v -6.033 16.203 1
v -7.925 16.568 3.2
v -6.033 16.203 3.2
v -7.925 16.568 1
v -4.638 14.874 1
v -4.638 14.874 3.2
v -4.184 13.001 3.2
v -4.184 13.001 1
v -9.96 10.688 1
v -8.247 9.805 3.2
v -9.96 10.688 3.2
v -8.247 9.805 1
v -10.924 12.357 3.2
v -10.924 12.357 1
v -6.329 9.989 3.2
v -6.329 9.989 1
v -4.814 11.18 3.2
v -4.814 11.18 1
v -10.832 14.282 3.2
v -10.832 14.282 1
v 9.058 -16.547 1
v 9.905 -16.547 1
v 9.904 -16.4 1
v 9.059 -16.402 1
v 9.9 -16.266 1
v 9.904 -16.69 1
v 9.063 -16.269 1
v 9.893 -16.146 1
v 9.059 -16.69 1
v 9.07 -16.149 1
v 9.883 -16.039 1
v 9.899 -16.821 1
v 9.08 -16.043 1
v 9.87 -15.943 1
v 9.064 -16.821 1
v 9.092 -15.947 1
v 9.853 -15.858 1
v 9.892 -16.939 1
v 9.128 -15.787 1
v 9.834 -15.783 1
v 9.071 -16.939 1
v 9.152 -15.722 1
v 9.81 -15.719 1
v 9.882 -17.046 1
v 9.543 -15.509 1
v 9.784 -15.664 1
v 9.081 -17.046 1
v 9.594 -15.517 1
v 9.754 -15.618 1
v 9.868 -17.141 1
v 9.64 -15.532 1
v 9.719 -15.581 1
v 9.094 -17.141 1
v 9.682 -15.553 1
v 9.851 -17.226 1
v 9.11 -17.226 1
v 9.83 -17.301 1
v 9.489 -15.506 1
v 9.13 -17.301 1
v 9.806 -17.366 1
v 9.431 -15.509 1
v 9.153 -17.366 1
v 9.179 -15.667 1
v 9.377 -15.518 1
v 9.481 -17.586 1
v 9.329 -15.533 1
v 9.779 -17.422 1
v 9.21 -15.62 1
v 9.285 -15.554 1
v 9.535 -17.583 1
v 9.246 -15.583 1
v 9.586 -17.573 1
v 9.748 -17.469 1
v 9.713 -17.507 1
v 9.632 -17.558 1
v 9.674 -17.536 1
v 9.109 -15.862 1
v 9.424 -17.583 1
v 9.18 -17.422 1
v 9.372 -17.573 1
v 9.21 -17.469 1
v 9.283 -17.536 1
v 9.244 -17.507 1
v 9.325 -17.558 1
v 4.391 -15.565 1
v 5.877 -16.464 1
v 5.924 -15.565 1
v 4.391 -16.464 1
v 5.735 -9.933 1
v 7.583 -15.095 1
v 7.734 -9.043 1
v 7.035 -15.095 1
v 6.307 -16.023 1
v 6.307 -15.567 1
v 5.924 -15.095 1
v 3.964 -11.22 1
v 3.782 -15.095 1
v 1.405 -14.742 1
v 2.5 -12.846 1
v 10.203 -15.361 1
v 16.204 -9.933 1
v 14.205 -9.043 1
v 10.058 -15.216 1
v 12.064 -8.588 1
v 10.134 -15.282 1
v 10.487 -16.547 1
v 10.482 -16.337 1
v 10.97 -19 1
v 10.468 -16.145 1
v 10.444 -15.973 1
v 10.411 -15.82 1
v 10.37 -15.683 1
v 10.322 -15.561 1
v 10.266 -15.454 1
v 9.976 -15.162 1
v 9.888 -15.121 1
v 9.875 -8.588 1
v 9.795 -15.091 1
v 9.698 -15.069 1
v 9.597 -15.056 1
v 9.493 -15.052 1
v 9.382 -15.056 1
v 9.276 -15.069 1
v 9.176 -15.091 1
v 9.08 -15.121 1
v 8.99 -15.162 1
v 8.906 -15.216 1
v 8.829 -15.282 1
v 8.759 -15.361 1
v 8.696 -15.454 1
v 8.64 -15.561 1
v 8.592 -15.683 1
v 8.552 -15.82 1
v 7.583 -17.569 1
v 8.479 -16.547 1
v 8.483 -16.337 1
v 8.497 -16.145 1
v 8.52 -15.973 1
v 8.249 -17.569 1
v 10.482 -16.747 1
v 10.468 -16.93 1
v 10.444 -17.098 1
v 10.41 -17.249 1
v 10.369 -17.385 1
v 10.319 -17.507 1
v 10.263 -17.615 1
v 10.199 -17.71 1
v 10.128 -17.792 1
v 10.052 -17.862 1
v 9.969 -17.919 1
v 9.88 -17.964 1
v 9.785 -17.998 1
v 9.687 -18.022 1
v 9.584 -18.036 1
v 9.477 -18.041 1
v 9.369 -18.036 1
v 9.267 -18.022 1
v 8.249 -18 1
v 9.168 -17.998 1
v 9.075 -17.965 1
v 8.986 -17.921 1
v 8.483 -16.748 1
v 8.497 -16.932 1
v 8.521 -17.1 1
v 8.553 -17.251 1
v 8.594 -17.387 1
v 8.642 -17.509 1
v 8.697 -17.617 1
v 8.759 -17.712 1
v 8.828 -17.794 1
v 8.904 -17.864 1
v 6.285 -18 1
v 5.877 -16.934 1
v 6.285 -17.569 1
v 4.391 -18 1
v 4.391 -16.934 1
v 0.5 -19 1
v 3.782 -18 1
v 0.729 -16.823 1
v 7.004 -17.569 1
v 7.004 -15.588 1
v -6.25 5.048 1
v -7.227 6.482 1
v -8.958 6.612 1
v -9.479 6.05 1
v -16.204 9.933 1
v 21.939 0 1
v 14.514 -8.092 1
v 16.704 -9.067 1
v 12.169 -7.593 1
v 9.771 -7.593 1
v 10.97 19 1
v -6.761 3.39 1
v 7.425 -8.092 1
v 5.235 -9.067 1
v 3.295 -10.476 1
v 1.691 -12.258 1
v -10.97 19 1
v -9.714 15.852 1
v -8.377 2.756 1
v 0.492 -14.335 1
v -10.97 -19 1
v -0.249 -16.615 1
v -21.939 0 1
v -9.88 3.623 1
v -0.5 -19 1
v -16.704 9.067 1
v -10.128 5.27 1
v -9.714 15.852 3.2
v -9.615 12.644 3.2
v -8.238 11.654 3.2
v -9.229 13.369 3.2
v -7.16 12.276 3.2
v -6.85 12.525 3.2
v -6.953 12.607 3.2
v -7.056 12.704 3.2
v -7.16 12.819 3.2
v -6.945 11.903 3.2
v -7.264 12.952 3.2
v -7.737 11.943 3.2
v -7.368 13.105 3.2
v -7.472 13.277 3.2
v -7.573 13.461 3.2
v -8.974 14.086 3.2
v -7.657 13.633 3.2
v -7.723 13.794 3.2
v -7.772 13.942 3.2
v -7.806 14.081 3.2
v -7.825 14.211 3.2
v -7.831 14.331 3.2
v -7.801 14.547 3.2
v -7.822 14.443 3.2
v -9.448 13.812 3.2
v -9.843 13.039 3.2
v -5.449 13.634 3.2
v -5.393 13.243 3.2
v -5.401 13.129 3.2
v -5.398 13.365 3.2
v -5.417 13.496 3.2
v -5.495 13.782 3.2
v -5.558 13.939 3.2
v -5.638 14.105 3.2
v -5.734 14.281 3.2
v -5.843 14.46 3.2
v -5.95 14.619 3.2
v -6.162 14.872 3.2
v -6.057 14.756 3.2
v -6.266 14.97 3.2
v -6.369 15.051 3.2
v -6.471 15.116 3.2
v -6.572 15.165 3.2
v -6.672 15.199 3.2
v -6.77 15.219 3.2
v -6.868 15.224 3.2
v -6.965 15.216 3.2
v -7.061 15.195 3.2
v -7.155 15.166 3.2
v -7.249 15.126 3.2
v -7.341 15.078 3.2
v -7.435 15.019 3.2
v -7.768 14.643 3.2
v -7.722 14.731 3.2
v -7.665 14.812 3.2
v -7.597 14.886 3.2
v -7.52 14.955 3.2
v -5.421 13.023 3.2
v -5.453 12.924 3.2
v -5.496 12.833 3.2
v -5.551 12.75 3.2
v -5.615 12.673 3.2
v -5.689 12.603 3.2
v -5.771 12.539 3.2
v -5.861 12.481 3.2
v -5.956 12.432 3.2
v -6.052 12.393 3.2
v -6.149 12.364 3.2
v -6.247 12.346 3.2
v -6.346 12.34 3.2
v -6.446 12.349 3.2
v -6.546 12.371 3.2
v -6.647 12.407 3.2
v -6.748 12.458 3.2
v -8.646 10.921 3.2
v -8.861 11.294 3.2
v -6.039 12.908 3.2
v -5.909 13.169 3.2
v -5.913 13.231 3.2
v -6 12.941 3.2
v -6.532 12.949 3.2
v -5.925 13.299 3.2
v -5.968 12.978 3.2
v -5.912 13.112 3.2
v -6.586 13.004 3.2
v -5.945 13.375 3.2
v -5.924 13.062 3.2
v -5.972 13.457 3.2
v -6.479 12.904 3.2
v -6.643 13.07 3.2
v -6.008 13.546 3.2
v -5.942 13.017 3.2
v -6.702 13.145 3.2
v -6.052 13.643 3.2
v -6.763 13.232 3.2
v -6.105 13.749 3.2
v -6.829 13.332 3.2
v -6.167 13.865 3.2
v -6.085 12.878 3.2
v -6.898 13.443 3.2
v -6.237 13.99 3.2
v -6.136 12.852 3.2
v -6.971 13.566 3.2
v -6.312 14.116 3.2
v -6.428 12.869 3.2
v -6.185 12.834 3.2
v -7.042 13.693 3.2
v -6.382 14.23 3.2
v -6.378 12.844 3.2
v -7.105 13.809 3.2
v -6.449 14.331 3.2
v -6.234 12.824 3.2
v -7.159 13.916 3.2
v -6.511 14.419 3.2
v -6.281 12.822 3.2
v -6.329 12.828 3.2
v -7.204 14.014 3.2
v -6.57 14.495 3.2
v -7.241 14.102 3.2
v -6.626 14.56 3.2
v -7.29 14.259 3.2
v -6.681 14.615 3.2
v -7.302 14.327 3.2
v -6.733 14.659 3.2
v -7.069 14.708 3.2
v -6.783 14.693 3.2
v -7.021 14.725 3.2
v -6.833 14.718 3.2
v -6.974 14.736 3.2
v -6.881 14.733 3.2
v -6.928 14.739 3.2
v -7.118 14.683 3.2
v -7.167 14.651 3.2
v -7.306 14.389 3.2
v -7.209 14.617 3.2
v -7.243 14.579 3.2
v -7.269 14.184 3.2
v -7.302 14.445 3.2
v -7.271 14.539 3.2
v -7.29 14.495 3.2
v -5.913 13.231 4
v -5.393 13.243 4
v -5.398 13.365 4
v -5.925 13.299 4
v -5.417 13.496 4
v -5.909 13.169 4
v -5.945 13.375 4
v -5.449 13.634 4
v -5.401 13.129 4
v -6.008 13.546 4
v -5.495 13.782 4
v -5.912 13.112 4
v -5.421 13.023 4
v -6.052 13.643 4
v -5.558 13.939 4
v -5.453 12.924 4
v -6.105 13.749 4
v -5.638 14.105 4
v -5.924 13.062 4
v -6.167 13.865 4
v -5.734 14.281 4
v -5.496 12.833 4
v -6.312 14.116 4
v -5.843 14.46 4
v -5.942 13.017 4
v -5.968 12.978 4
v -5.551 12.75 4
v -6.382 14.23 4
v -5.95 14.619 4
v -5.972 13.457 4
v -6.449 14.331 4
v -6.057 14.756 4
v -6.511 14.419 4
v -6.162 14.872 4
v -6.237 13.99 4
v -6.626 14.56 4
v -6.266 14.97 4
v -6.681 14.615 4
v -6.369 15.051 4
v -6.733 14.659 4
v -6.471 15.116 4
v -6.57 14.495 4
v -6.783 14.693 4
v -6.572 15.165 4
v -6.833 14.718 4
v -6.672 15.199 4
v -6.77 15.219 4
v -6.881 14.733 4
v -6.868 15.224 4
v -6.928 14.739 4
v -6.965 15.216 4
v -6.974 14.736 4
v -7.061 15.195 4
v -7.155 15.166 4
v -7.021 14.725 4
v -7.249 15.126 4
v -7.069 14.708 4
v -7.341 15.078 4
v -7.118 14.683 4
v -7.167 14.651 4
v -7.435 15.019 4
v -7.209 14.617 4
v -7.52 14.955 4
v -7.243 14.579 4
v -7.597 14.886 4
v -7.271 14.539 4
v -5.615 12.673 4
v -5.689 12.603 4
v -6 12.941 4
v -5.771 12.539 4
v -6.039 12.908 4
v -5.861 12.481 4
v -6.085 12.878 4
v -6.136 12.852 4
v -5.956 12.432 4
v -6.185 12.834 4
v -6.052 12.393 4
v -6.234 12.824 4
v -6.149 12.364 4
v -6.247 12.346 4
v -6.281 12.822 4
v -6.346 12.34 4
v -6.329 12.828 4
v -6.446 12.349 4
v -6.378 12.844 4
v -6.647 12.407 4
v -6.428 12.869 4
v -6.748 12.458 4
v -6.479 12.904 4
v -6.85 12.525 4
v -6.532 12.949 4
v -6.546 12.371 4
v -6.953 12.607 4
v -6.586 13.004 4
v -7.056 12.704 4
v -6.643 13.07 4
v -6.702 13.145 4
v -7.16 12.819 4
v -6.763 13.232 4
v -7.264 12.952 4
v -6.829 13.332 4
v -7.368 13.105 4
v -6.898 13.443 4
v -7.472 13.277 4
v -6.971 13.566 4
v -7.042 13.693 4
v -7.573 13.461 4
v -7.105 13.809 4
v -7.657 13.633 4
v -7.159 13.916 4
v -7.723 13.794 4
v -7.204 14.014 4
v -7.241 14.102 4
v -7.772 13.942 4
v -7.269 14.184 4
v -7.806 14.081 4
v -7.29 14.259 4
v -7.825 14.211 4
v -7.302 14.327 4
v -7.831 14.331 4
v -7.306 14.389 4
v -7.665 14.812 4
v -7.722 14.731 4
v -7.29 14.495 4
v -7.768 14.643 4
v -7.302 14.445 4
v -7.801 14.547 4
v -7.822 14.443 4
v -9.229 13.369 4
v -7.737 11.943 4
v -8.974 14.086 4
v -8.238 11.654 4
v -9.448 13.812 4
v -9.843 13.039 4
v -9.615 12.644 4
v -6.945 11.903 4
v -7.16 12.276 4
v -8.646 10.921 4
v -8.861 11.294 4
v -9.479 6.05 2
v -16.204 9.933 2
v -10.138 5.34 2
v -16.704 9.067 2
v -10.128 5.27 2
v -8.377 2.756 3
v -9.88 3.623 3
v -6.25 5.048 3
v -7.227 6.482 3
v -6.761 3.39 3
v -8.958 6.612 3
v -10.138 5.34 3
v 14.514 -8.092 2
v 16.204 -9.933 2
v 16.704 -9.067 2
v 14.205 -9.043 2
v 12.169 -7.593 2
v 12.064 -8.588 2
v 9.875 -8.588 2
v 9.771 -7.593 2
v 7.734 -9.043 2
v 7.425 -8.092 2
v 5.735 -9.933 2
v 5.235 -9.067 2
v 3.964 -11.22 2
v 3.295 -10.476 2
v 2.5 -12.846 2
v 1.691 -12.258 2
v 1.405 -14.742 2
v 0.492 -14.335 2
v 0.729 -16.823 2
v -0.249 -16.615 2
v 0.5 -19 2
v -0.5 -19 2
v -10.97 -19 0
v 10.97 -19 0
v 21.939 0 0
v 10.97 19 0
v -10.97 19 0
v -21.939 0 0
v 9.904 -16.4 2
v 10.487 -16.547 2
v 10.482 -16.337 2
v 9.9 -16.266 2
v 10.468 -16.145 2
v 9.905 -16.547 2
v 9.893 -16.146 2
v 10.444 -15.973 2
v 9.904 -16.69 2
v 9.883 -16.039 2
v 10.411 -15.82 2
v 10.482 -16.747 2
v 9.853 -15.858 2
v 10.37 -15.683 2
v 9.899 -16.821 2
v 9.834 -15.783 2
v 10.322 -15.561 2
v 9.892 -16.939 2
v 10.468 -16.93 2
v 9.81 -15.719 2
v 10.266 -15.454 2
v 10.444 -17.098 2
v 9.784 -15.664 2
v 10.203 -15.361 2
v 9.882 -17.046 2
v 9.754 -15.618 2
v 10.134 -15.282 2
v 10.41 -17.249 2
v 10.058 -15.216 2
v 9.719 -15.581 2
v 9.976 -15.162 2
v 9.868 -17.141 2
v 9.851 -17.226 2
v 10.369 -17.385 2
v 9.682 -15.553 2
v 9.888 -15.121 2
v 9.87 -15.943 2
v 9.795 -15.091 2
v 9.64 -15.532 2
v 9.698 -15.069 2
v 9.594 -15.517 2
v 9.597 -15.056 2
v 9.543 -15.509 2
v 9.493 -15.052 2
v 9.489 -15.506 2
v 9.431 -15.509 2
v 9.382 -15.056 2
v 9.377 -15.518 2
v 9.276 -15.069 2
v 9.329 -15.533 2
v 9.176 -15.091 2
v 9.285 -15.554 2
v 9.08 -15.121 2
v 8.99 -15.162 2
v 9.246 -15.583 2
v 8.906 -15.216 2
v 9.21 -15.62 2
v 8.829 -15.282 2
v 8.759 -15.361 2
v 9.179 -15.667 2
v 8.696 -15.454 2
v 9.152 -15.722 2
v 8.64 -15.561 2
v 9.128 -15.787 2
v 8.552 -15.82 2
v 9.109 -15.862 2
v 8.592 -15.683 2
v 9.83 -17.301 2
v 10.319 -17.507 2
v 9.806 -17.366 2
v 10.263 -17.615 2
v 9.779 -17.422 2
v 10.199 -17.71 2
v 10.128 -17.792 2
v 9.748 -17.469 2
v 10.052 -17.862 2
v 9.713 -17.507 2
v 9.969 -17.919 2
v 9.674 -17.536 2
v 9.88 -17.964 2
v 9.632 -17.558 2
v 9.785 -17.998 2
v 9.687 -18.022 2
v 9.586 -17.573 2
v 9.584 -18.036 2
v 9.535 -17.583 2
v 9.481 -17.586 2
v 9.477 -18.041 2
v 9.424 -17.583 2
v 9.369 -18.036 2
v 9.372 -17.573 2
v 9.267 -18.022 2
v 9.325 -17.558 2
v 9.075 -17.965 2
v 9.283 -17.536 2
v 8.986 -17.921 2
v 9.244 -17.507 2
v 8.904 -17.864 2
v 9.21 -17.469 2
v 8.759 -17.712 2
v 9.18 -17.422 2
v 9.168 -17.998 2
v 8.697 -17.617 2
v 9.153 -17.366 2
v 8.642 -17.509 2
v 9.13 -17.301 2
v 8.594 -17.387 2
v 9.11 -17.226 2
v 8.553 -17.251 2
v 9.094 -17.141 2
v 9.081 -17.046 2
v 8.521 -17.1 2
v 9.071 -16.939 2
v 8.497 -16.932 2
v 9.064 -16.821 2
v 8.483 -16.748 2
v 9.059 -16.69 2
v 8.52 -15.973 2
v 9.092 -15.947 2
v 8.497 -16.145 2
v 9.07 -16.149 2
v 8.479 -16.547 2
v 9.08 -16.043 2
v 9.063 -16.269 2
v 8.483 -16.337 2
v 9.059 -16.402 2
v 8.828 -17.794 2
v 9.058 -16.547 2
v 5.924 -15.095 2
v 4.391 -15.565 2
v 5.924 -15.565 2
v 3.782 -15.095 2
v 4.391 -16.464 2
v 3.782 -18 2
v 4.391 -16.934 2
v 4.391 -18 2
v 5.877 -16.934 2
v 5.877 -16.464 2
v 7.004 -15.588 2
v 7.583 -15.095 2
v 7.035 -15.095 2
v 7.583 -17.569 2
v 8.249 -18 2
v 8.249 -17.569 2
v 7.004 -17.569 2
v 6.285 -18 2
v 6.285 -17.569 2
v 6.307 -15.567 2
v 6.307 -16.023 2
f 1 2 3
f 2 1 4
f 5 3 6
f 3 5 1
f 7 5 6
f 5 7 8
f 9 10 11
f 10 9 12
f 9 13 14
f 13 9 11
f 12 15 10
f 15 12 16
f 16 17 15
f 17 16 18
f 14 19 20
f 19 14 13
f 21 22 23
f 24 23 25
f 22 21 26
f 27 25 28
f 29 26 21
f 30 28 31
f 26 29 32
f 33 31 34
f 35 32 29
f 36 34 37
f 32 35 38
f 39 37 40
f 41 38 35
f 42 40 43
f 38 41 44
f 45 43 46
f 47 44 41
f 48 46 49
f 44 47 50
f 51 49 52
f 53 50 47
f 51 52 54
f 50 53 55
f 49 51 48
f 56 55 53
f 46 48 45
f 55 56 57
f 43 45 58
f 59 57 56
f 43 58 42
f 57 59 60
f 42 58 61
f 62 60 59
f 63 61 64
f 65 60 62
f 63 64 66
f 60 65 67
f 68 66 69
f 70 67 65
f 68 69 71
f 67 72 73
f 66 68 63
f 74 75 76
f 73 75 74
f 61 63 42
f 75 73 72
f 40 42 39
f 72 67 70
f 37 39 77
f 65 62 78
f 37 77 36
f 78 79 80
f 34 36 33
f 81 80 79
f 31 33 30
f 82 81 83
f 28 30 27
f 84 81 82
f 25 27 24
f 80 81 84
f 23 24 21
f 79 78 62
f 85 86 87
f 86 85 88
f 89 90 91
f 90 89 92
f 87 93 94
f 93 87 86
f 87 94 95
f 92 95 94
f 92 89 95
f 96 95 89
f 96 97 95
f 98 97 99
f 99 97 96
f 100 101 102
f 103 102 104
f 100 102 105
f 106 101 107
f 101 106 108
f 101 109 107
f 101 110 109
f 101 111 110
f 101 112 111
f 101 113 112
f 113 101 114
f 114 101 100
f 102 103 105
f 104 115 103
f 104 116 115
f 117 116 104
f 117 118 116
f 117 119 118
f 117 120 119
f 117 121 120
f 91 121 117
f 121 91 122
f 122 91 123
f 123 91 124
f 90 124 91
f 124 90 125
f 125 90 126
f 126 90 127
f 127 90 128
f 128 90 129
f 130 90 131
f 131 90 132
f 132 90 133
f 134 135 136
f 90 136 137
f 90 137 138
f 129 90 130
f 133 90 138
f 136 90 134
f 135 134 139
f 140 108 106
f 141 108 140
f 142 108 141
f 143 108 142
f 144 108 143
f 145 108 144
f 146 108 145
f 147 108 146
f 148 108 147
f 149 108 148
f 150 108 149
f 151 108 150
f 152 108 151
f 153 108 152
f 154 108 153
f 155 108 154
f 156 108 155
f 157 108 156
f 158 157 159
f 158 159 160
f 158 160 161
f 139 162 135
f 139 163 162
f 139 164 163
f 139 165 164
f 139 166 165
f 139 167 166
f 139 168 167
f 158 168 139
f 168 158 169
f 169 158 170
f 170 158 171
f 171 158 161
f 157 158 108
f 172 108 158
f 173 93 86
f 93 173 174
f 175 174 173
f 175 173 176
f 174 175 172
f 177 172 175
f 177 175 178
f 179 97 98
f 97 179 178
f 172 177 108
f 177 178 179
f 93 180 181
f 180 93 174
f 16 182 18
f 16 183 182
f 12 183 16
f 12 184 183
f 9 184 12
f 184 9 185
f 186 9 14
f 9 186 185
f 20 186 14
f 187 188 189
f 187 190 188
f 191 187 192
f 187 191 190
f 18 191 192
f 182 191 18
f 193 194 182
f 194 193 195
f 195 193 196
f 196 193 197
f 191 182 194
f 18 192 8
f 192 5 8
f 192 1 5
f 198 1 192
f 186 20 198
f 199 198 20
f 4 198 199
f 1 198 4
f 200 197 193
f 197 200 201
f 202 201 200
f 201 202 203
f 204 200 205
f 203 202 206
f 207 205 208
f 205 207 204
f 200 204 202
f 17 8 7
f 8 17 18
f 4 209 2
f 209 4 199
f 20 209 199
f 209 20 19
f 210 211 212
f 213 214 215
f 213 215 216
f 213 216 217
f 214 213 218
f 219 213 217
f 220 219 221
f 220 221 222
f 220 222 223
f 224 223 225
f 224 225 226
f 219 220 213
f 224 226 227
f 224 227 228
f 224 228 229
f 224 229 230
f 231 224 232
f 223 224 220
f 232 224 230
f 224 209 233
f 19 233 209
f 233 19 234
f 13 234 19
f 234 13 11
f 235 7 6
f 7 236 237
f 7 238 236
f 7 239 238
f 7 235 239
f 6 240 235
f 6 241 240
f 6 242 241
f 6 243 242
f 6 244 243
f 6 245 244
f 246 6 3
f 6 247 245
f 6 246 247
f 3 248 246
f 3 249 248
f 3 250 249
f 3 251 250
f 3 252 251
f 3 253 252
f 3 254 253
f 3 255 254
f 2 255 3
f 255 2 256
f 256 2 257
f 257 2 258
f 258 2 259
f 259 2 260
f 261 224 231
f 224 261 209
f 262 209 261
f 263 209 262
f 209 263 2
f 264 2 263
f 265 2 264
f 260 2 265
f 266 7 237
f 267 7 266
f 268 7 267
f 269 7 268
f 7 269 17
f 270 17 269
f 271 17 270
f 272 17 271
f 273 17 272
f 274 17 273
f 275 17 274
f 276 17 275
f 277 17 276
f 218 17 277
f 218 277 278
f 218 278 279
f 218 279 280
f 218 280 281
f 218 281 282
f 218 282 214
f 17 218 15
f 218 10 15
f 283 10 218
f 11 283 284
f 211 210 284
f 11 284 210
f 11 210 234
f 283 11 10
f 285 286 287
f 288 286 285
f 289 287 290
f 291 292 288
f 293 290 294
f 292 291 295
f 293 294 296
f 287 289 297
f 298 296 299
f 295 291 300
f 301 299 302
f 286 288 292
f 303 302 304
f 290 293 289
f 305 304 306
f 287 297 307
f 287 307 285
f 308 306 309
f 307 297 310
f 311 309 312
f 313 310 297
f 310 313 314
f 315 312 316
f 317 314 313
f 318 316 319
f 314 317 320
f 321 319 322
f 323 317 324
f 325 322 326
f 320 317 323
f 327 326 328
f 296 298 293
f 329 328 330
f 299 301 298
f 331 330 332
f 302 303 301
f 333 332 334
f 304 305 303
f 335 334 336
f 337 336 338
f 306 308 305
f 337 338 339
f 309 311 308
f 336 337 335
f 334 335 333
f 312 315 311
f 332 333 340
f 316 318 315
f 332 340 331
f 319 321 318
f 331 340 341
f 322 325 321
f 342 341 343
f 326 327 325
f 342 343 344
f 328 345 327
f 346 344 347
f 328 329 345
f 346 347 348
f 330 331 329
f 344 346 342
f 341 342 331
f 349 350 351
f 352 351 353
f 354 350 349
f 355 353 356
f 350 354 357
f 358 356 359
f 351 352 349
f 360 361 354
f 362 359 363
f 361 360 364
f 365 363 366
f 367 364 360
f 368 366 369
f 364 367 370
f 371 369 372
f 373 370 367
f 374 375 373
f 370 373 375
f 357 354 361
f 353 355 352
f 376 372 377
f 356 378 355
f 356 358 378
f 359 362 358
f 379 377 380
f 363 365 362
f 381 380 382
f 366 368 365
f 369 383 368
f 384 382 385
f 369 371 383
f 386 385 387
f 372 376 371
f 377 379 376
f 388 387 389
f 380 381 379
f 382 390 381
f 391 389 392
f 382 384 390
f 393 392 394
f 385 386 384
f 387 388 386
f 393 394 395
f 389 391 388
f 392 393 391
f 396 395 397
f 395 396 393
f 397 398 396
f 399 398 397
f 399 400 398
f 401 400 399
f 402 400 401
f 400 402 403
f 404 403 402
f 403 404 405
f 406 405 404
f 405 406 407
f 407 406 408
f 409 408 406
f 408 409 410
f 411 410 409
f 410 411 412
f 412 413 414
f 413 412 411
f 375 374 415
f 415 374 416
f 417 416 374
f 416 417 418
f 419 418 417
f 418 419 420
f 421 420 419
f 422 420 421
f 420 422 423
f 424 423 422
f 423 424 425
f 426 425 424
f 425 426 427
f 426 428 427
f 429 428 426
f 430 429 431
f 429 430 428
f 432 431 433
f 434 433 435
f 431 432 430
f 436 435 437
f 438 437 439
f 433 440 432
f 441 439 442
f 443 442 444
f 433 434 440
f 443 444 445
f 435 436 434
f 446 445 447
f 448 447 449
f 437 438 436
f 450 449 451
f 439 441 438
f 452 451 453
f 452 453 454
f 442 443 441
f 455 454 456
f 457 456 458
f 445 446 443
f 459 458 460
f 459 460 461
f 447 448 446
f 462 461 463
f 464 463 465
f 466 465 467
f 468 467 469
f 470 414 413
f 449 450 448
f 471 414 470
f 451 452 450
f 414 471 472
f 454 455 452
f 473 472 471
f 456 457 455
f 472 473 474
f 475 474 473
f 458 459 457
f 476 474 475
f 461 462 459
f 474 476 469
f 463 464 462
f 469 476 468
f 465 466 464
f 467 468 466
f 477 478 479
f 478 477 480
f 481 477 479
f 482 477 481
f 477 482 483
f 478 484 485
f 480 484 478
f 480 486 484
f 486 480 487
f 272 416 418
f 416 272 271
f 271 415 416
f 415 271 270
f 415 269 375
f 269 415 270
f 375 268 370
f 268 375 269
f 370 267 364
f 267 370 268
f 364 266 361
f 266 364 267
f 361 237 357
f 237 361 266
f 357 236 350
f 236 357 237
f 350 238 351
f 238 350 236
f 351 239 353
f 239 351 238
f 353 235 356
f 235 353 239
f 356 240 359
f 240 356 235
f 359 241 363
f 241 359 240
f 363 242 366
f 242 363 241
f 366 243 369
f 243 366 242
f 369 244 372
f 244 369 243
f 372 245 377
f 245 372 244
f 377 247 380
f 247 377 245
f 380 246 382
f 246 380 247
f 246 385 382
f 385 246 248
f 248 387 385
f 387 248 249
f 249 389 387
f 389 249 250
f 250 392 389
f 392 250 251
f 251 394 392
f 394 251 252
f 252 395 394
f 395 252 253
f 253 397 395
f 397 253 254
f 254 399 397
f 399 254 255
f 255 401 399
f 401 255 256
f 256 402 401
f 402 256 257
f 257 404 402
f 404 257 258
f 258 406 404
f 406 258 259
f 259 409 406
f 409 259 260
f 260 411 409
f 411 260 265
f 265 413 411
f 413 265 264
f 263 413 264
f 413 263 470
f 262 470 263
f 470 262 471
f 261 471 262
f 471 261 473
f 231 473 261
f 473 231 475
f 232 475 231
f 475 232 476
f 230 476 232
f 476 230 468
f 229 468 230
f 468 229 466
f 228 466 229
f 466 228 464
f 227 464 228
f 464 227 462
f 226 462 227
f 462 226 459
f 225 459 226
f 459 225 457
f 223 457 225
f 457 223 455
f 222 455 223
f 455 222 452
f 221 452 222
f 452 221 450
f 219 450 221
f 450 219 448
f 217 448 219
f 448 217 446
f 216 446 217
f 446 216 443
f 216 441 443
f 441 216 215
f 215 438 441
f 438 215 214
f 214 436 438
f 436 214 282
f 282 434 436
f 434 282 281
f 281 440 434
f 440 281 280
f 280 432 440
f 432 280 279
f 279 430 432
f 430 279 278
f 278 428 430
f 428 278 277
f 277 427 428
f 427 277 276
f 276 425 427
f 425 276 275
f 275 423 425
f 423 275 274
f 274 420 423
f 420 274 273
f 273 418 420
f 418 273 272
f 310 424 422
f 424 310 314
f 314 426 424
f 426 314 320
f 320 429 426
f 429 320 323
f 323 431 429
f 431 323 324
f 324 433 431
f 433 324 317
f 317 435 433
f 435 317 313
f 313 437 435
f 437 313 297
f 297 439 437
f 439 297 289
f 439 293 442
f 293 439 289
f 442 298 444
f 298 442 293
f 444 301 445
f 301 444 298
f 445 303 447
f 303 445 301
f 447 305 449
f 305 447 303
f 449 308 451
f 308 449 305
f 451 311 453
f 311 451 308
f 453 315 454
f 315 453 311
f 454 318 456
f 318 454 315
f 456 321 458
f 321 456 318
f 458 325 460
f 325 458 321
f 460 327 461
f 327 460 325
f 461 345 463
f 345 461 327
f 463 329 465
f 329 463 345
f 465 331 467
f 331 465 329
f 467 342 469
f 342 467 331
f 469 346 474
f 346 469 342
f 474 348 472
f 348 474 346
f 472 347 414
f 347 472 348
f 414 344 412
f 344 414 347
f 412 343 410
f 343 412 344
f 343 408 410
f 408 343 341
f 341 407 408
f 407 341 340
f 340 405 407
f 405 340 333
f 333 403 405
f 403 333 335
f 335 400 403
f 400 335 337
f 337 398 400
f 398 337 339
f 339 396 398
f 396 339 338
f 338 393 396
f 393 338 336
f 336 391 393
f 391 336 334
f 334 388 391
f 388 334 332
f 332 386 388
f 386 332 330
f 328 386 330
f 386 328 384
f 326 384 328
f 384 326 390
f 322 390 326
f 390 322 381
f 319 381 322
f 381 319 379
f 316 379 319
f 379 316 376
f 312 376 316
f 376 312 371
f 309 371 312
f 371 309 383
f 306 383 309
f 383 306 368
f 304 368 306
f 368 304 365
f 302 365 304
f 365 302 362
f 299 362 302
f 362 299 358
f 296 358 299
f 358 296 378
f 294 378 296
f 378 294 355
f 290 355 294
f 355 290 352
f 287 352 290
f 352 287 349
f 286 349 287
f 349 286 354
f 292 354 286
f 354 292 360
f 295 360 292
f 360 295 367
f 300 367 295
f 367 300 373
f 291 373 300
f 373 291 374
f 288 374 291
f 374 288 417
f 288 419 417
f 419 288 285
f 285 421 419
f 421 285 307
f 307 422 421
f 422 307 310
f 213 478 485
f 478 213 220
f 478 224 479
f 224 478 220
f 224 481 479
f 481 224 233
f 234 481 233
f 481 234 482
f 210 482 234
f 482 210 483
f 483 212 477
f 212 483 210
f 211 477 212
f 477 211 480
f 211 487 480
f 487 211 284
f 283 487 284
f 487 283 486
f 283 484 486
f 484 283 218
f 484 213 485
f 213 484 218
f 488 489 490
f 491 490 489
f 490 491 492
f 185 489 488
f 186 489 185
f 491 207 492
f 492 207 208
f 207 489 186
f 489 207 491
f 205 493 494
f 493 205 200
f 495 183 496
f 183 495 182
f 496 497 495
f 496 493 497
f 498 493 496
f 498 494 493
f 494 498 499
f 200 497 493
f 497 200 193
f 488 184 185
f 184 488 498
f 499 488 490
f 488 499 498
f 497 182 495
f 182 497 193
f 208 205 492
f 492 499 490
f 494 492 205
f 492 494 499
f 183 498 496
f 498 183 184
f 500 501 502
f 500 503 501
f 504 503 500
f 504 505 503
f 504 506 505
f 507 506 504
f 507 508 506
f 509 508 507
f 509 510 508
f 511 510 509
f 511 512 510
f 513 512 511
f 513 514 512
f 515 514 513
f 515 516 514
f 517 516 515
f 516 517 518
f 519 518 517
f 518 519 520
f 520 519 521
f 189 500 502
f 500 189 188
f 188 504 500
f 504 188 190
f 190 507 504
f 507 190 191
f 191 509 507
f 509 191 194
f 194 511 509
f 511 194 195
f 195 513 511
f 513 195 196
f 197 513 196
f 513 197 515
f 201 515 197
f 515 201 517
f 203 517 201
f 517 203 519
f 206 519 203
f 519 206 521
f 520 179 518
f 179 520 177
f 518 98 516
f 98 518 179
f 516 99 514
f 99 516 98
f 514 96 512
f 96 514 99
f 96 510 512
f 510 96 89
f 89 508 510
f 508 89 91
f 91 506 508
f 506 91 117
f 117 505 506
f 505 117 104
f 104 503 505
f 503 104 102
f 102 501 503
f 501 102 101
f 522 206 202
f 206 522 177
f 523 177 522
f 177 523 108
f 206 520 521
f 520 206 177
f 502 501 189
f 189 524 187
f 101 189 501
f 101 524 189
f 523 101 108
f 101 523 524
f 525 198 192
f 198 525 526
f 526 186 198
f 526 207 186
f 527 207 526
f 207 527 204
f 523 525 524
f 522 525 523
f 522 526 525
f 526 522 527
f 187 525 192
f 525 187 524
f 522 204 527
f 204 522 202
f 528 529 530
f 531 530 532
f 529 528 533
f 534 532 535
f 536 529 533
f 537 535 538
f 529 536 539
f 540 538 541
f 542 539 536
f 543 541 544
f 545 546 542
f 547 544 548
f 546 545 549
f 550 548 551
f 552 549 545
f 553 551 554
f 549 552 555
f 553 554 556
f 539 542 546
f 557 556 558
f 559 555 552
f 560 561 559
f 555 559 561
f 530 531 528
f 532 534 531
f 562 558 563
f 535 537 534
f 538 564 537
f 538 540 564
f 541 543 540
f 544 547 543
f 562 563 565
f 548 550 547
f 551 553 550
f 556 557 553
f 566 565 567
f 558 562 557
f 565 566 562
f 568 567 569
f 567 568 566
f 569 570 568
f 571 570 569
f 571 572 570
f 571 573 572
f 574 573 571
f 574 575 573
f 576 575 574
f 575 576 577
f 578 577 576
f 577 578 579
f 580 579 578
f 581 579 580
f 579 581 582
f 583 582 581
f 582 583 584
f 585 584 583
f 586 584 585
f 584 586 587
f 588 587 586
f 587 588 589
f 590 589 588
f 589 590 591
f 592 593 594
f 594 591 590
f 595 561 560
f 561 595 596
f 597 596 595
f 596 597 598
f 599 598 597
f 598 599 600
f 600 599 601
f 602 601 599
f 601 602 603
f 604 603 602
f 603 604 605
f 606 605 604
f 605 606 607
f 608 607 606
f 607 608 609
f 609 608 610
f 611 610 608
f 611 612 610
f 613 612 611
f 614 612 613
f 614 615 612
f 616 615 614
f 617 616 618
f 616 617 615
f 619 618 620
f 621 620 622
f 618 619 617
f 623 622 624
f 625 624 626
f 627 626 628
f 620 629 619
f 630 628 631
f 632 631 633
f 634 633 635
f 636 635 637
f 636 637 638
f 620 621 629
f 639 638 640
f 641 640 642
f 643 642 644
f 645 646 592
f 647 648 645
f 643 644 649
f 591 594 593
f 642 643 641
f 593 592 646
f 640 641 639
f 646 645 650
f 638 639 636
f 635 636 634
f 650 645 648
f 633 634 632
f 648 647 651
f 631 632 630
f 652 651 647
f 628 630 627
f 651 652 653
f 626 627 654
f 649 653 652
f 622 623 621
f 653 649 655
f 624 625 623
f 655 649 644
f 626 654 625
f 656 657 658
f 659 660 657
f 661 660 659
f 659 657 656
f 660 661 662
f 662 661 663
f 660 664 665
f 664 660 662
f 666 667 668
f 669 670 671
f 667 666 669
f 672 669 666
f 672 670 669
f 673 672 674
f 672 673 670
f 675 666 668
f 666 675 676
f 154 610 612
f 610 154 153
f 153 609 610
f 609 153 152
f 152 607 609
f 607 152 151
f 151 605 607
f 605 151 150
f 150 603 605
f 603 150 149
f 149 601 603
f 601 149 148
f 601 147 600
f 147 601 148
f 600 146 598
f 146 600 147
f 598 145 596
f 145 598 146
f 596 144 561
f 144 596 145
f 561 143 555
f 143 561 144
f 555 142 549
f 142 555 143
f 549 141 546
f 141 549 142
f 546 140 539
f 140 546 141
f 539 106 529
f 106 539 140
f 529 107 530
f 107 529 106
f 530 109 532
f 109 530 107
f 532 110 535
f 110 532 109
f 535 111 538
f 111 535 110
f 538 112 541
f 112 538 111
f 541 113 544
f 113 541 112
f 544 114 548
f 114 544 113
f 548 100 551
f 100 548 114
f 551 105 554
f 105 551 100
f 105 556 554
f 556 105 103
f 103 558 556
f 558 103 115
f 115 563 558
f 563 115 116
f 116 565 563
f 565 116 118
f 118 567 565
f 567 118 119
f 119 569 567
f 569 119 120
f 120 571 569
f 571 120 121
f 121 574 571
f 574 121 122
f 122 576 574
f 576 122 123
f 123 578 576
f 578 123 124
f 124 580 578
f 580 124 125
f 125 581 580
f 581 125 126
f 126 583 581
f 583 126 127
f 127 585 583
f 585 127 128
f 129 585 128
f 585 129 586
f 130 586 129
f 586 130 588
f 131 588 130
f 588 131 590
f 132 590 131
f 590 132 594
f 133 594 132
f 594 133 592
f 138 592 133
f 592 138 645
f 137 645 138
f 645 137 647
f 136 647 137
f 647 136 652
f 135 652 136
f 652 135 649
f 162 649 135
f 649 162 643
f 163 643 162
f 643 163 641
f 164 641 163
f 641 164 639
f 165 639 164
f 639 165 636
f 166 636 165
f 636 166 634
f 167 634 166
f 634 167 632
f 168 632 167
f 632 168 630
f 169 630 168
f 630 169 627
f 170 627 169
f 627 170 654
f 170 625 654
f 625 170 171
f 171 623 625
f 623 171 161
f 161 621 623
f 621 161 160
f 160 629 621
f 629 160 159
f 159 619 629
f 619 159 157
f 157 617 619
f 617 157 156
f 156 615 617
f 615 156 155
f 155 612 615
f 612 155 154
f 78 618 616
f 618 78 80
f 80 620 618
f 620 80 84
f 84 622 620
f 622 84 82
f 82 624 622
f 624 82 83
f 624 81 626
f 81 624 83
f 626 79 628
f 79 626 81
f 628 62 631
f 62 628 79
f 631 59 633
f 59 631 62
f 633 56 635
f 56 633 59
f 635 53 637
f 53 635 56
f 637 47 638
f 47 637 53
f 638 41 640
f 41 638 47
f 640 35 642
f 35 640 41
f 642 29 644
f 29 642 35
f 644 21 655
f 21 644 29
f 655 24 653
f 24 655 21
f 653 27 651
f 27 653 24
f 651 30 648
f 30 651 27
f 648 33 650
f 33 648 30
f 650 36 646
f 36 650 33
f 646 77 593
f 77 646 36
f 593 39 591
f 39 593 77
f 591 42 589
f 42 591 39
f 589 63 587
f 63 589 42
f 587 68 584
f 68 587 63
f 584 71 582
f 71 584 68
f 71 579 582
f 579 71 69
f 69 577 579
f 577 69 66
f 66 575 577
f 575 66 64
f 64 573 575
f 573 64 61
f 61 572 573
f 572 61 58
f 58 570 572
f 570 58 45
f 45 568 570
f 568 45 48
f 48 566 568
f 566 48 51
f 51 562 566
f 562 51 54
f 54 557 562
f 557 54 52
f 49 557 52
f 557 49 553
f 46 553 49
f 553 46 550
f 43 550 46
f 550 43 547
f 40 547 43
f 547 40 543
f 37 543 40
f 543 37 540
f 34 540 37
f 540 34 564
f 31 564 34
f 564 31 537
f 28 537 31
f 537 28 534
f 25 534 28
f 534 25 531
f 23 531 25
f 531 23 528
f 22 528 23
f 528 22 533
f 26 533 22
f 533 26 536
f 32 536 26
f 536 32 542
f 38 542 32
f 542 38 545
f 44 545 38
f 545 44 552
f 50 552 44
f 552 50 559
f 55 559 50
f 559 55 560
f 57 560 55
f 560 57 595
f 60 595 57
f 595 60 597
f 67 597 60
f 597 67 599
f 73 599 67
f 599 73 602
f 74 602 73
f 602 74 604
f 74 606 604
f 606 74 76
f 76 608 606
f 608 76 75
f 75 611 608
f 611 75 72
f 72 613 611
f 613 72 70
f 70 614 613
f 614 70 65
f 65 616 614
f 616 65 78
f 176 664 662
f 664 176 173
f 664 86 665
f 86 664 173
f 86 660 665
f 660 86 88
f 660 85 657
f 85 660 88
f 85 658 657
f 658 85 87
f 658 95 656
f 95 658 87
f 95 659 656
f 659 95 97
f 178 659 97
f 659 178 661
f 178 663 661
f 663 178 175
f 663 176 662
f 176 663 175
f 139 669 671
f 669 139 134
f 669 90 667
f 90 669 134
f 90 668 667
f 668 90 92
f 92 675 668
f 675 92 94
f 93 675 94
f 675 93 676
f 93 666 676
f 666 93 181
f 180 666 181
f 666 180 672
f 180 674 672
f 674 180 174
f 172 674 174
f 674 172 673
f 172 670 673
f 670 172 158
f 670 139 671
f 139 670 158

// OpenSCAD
include <../../Scripts/18xx tiles basic functions.scad>
hex("blue");
put_tilenr("F10");
put_value_blue("10",-30);
small_town_single(r=1);
sharp_curve(0);
